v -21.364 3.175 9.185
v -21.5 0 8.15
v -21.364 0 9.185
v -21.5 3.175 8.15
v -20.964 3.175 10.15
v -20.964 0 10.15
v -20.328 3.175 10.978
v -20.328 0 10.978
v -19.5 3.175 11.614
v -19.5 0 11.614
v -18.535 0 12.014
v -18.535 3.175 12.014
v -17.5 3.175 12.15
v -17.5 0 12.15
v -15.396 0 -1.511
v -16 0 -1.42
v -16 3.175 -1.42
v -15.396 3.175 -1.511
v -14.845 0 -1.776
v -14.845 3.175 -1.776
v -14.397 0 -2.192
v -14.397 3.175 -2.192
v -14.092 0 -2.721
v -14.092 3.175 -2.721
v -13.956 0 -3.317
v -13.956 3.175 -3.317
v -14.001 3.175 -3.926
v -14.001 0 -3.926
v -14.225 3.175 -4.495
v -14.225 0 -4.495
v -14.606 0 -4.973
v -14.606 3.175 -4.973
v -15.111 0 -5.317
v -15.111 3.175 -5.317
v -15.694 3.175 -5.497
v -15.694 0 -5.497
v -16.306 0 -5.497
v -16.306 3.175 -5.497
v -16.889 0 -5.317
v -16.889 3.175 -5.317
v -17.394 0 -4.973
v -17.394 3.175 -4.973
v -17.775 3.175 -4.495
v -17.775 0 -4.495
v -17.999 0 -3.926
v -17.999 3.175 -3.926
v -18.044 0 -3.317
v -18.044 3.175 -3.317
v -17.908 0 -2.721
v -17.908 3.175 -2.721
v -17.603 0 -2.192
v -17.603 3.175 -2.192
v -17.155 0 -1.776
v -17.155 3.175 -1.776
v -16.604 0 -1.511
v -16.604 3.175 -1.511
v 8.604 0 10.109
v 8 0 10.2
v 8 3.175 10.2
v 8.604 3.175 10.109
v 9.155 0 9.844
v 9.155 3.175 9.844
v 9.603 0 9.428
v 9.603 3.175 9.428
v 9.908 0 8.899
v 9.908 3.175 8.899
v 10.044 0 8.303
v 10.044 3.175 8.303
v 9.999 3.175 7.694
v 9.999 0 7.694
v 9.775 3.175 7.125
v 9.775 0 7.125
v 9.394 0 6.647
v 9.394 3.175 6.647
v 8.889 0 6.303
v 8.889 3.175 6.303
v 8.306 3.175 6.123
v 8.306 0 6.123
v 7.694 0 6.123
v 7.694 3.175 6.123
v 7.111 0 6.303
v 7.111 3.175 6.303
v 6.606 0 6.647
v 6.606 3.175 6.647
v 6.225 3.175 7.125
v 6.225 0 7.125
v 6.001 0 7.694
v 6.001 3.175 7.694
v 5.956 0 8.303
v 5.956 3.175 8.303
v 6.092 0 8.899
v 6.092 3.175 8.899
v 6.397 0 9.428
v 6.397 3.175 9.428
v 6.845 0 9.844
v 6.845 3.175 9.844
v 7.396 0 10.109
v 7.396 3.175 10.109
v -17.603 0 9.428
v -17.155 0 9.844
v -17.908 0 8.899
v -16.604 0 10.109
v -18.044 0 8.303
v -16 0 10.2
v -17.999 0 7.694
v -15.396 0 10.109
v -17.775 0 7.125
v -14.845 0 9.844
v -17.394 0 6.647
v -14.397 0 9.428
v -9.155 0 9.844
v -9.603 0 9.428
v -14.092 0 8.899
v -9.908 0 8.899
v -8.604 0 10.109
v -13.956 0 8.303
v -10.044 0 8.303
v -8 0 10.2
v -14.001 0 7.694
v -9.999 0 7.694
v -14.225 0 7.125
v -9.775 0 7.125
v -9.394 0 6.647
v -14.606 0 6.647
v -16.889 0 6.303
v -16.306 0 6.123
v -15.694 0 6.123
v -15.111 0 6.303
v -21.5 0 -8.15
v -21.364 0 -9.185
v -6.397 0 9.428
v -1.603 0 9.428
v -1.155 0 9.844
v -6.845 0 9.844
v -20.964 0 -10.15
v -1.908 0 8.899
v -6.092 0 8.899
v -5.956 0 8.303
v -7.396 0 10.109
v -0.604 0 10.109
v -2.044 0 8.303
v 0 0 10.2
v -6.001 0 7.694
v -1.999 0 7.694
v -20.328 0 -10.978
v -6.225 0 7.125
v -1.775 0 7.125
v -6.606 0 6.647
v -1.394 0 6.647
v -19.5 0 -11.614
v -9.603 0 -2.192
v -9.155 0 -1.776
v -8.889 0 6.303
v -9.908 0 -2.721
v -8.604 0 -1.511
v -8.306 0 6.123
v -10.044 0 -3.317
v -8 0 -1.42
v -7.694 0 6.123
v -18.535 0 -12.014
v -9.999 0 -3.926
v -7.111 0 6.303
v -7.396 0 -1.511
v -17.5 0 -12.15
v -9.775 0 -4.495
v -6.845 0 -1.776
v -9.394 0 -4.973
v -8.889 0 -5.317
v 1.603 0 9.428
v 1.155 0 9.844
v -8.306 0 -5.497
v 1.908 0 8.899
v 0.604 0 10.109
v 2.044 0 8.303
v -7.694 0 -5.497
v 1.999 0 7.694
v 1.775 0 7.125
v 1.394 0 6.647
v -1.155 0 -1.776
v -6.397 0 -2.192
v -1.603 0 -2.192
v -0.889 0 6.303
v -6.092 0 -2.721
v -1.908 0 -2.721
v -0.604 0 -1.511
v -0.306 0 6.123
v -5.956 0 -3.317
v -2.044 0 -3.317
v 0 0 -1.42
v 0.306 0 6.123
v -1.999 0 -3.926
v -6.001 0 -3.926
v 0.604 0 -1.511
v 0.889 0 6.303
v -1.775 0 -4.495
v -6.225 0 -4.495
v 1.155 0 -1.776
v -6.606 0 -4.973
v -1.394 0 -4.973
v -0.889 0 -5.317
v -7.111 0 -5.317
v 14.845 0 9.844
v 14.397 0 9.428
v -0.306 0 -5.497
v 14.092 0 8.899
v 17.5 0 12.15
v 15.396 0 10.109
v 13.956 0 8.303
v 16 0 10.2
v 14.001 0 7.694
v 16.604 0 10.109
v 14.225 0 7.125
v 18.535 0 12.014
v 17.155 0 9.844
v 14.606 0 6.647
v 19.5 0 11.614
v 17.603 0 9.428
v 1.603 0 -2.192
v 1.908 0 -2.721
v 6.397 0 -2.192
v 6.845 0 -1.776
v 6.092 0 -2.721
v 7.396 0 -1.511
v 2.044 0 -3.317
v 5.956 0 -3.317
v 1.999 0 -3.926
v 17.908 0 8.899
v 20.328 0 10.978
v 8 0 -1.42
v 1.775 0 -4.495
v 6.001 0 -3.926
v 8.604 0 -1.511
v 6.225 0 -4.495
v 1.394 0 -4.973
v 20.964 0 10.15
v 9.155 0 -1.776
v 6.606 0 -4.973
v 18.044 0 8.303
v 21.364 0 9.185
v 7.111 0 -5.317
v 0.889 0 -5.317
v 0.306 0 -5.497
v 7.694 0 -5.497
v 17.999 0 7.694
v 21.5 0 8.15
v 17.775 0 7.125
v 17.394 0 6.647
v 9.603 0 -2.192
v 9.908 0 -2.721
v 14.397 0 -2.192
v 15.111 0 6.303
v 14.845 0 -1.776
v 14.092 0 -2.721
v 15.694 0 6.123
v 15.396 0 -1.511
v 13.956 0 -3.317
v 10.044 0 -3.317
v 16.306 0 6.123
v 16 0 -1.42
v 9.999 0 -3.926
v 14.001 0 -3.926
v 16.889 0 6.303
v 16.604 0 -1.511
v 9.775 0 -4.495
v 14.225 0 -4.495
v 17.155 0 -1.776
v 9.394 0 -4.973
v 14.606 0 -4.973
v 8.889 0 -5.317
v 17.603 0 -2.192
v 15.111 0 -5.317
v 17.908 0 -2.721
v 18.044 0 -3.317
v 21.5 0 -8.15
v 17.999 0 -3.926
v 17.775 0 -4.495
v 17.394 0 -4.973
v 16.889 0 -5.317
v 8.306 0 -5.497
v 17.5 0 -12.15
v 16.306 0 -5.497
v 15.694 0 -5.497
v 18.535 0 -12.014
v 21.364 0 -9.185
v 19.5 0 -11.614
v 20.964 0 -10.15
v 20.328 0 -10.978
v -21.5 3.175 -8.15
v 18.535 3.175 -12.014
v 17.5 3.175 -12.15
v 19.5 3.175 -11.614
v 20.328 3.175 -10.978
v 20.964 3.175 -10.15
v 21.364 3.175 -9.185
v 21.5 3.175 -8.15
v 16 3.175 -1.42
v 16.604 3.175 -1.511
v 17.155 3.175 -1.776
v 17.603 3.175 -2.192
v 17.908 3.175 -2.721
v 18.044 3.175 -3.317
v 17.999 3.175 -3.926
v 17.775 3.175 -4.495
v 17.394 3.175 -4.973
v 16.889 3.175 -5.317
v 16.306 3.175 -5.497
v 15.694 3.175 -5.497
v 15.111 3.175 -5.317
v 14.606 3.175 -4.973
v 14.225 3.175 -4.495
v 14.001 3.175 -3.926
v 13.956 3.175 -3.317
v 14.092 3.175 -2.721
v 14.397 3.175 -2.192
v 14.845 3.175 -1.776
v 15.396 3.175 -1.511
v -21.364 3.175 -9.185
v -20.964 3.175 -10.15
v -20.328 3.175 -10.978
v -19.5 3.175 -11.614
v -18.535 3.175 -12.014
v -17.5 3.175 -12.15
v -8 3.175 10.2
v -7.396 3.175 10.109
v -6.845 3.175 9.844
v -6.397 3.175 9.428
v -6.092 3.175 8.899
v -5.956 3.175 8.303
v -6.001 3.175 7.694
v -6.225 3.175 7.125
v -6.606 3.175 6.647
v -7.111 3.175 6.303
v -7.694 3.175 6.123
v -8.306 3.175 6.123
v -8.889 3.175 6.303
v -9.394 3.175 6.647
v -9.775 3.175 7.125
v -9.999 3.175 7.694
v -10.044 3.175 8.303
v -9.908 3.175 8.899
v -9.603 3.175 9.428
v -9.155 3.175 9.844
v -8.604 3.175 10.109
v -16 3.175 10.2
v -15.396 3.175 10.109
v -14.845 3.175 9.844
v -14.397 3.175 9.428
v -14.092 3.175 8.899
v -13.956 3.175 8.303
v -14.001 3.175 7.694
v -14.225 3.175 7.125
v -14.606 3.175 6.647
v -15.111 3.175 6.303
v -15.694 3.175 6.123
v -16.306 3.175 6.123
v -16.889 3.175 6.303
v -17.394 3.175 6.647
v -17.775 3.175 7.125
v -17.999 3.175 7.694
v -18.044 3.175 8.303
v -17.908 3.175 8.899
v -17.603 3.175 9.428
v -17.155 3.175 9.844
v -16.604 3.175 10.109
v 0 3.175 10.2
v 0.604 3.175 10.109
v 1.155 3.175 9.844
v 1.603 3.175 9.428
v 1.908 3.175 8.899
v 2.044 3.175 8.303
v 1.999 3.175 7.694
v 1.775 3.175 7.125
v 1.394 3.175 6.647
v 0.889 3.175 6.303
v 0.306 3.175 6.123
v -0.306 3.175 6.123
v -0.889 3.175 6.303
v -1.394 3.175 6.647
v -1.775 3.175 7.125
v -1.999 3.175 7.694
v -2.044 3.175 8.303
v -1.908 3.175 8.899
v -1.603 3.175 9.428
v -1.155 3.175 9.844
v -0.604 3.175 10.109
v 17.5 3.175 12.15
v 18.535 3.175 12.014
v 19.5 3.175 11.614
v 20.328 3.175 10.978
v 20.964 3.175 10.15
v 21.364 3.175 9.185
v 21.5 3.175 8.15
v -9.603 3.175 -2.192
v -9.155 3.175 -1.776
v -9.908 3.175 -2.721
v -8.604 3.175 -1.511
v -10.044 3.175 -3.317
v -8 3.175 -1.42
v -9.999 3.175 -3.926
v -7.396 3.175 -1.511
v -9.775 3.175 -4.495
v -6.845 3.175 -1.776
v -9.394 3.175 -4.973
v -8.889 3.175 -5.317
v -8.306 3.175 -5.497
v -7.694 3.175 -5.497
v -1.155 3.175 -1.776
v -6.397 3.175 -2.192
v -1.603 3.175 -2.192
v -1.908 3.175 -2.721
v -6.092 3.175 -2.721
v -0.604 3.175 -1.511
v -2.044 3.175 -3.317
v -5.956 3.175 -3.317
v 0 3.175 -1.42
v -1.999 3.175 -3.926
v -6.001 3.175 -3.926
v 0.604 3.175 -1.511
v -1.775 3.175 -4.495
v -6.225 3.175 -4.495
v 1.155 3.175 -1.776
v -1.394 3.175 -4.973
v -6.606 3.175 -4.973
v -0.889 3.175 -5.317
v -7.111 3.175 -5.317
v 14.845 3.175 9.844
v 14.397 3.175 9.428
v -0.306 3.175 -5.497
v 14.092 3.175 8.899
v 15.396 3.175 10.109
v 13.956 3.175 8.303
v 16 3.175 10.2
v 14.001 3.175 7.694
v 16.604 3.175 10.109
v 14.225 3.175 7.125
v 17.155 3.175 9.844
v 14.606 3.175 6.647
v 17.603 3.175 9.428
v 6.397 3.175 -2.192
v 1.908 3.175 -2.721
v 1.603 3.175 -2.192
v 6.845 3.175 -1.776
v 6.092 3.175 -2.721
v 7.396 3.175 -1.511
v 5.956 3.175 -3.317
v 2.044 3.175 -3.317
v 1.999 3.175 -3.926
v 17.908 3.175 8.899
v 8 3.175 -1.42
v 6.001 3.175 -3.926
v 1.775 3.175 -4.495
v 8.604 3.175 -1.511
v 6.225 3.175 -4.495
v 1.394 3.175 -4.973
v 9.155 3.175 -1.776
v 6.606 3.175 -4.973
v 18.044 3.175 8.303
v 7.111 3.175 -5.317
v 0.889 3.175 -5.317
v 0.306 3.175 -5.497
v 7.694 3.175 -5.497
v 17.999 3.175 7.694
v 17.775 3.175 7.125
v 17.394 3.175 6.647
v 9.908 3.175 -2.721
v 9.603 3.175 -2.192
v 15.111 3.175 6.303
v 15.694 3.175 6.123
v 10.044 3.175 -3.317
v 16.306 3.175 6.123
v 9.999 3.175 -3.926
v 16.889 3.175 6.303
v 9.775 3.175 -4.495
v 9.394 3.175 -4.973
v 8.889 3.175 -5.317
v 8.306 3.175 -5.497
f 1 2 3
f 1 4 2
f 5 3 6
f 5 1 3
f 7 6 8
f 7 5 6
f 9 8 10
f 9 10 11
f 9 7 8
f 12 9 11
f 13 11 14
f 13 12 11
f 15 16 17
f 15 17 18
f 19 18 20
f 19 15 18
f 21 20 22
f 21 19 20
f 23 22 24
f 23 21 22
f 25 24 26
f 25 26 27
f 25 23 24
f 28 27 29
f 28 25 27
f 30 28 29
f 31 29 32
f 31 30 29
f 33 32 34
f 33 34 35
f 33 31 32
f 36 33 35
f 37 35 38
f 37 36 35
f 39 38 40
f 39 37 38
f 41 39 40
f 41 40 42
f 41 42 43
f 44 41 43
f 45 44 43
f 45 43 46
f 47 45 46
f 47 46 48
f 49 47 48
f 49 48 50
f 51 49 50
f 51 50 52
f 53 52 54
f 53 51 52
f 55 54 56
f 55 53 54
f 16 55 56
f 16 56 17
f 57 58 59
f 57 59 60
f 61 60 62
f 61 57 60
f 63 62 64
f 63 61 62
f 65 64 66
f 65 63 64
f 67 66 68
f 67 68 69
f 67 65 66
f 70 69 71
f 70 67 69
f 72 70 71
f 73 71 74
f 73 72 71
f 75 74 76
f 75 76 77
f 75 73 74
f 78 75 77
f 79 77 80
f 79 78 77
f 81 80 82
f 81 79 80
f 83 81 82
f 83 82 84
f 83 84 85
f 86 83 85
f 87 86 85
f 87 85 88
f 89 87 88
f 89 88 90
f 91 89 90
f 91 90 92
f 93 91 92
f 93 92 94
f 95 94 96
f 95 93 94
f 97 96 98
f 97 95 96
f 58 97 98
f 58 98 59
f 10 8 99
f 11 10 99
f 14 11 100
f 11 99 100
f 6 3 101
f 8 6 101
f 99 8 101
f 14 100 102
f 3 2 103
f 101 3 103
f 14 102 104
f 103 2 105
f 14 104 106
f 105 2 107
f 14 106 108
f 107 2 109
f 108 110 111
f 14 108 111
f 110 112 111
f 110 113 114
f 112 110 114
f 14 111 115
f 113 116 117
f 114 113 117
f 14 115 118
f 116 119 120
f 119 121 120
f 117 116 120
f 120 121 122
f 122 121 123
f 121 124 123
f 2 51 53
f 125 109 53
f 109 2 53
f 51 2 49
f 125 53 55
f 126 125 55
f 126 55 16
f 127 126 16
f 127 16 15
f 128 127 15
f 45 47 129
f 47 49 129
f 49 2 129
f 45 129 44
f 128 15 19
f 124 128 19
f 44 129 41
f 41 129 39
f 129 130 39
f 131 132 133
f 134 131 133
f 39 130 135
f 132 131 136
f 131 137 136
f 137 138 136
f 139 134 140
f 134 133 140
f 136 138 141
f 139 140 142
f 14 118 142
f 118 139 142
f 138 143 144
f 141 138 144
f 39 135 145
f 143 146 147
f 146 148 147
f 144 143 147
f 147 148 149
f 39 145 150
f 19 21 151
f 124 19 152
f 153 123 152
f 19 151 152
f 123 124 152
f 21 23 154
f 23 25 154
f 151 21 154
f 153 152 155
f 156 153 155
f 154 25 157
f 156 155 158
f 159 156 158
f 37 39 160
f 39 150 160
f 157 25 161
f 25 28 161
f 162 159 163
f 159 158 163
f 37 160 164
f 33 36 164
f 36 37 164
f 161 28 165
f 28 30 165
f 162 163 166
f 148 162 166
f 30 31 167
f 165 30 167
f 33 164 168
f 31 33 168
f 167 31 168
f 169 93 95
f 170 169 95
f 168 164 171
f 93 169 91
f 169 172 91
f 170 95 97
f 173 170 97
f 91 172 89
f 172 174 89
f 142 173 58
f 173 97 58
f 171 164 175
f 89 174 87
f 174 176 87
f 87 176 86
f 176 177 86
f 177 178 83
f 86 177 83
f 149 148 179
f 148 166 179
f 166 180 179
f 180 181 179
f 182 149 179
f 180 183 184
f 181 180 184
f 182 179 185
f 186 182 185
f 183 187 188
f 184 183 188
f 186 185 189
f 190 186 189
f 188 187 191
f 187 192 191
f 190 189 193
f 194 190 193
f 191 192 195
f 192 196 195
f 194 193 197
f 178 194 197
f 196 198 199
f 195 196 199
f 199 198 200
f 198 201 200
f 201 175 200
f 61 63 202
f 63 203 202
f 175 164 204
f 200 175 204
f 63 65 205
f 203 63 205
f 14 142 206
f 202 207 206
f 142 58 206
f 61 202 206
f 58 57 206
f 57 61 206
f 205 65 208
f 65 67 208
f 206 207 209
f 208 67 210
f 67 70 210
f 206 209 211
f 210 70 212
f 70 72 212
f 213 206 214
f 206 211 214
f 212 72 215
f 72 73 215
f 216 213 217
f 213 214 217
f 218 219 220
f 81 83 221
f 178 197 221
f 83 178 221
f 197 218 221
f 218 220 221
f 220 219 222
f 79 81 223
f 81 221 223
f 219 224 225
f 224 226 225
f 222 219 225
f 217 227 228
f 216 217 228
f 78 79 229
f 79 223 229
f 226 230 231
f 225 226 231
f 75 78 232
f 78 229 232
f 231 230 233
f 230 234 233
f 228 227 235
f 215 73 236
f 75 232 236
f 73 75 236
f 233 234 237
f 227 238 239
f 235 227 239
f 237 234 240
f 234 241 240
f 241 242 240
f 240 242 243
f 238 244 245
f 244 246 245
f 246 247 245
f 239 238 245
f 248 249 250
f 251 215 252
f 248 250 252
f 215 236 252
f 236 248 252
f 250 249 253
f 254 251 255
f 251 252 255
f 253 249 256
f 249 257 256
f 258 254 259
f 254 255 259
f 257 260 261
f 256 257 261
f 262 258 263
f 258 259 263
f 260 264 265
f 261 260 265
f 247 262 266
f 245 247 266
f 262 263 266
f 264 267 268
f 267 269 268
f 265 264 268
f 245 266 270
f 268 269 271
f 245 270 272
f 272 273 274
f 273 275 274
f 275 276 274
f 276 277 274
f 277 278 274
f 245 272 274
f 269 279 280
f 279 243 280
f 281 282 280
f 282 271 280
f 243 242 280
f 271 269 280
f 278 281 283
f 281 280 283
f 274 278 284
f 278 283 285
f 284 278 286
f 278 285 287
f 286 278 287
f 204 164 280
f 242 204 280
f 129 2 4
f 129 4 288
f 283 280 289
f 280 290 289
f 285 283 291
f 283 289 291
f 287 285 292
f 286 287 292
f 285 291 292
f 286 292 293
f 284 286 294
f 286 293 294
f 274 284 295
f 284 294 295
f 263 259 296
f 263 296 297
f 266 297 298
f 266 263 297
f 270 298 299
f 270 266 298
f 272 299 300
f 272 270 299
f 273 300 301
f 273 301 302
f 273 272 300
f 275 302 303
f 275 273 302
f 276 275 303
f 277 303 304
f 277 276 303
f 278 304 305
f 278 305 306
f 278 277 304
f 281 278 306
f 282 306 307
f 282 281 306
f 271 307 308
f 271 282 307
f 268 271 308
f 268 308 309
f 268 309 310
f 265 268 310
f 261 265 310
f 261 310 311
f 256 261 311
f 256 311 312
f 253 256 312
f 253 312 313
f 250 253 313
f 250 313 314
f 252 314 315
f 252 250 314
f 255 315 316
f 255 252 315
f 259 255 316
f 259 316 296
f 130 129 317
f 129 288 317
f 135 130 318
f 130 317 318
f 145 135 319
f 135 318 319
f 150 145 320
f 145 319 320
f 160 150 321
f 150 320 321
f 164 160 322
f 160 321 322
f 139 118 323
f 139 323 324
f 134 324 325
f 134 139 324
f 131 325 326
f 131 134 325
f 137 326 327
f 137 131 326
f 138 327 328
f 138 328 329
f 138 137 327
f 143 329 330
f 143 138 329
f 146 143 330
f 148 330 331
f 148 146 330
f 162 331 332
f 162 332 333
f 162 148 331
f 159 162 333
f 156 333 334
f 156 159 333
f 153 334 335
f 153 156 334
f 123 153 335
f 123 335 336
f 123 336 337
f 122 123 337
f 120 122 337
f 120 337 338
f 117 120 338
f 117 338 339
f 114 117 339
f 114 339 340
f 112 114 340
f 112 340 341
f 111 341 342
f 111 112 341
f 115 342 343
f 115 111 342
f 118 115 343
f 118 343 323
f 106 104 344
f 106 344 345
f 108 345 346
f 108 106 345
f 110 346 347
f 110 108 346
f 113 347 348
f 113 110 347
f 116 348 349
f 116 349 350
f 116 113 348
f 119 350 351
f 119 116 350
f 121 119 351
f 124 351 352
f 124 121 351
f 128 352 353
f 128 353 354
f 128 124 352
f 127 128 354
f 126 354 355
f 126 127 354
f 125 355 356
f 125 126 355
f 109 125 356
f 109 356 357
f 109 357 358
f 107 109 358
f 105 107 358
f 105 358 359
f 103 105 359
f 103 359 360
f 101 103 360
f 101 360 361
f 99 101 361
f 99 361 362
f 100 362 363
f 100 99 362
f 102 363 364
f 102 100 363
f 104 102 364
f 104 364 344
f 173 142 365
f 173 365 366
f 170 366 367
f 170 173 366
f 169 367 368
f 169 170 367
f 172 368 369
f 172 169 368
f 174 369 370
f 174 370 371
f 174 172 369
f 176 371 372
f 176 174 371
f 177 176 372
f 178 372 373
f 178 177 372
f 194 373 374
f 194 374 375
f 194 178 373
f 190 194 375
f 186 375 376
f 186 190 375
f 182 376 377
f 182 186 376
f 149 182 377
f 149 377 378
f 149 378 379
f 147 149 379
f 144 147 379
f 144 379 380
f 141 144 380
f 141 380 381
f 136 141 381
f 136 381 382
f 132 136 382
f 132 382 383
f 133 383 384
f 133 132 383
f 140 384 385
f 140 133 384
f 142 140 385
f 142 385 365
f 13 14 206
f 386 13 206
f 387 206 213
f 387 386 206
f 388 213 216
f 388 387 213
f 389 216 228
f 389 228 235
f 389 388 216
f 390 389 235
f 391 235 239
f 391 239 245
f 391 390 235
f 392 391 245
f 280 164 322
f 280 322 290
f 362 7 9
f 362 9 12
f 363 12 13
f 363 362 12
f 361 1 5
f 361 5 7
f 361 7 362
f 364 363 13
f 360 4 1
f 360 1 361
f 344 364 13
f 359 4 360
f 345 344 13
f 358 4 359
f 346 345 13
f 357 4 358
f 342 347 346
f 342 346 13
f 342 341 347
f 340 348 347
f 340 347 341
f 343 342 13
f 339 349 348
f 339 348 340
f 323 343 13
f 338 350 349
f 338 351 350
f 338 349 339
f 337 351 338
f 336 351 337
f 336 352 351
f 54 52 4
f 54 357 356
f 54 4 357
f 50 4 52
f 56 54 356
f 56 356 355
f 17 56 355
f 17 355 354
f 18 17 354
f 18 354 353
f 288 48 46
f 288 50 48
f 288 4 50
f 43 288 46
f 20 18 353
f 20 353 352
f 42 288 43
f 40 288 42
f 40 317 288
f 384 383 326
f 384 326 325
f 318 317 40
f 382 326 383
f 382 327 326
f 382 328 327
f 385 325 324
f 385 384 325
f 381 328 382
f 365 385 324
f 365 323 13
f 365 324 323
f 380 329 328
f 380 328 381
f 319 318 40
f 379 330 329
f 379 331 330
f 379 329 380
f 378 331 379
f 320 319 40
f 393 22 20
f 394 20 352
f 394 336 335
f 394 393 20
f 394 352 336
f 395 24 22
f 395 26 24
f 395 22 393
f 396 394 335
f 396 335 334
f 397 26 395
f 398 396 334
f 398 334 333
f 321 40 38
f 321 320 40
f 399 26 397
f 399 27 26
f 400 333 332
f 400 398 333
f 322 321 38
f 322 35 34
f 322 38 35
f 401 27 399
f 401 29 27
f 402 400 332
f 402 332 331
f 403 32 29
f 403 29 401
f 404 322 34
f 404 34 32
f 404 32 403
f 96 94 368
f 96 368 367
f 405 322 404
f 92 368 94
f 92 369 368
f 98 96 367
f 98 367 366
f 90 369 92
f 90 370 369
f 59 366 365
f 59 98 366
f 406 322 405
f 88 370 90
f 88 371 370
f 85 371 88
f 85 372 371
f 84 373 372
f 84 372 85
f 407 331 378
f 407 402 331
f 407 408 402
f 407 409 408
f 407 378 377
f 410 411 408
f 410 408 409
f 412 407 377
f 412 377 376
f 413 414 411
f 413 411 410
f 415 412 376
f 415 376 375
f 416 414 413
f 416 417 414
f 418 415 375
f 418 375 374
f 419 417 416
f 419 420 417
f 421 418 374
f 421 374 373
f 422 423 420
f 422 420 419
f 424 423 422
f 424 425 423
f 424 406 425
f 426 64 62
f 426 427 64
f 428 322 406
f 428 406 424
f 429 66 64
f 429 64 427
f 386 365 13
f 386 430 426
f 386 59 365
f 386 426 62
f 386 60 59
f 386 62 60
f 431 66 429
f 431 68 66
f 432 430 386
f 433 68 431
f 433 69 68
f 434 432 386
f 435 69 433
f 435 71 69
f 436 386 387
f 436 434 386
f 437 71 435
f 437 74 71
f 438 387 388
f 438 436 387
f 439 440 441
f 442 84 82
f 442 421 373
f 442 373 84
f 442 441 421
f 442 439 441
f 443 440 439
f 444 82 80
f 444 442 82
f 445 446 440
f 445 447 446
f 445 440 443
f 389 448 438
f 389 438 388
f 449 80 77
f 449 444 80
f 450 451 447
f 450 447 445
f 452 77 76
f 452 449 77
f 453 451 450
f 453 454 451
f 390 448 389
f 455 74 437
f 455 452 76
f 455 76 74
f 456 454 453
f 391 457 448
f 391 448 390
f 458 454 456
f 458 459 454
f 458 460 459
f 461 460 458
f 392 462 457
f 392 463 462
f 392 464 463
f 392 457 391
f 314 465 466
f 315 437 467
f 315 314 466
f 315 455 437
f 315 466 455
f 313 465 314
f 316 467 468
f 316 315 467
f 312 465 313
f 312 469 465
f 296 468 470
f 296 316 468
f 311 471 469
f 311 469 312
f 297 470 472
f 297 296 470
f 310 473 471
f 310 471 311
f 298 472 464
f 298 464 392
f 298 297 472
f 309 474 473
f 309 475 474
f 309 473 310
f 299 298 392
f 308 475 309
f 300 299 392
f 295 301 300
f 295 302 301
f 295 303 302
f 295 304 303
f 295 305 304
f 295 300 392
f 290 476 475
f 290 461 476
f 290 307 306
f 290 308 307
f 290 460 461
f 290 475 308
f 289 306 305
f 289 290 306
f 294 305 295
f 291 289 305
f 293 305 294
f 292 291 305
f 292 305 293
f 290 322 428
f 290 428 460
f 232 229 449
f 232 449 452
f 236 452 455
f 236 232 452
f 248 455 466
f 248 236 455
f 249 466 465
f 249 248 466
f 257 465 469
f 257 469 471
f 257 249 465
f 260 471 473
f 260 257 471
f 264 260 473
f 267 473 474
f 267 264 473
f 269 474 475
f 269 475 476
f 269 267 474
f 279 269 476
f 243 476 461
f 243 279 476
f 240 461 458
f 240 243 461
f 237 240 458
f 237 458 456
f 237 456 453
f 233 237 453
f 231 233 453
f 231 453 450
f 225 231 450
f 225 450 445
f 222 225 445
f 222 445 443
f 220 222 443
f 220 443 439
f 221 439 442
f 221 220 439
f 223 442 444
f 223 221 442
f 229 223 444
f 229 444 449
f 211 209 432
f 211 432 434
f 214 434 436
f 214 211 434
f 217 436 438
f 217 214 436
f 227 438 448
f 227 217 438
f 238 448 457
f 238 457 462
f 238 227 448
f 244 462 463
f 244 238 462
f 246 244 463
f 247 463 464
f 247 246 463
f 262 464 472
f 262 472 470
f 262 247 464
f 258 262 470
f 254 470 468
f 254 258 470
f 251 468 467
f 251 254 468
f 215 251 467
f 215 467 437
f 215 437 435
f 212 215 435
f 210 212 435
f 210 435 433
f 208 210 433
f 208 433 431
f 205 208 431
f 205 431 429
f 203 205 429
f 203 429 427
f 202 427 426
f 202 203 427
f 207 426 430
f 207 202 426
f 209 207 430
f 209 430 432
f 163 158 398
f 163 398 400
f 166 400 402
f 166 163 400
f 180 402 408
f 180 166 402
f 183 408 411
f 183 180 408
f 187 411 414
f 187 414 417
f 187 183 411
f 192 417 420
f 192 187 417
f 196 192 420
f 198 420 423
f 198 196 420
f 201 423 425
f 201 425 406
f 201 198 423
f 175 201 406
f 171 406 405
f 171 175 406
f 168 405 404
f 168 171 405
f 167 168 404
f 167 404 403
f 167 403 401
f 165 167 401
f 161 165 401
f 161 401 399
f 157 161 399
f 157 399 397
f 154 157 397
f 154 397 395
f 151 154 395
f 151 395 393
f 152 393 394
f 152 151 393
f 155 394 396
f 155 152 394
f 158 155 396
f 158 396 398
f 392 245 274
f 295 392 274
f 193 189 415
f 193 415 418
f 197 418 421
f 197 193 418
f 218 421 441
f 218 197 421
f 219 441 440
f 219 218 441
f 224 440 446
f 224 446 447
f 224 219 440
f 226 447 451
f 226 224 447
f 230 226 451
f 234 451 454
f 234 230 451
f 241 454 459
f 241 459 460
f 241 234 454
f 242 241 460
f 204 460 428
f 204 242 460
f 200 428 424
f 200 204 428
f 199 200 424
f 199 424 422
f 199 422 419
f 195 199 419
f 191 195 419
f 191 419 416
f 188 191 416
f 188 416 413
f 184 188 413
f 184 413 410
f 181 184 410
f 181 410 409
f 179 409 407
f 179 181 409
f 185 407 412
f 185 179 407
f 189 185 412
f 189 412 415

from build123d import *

# Parameters (mm, degrees)
SKETCH1_W           = 43
SKETCH1_H           = 24.3
SKETCH1_R           = 2.05
BOSS_EXTRUDE1_DEPTH = 3.175
FILLET1_R           = 4


with BuildPart() as part:
    # Sketch1 → Boss-Extrude1 (new body)
    with BuildSketch(Plane(origin=(0, 0, 0), x_dir=(1, 0, 0), z_dir=(0, 1, 0))):
        Rectangle(SKETCH1_W, SKETCH1_H)
        with Locations(Location((-16, -8.15, 0), (0, 0, 270))):
            Circle(SKETCH1_R, mode=Mode.SUBTRACT)
        with Locations(Location((-8, -8.15, 0), (0, 0, 270))):
            Circle(SKETCH1_R, mode=Mode.SUBTRACT)
        with Locations(Location((0, -8.15, 0), (0, 0, 270))):
            Circle(SKETCH1_R, mode=Mode.SUBTRACT)
        with Locations(Location((8, -8.15, 0), (0, 0, 270))):
            Circle(SKETCH1_R, mode=Mode.SUBTRACT)
        with Locations(Location((16, -8.15, 0), (0, 0, 270))):
            Circle(SKETCH1_R, mode=Mode.SUBTRACT)
        with Locations(Location((-16, 3.47, 0), (0, 0, 270))):
            Circle(SKETCH1_R, mode=Mode.SUBTRACT)
        with Locations(Location((-8, 3.47, 0), (0, 0, 270))):
            Circle(SKETCH1_R, mode=Mode.SUBTRACT)
        with Locations(Location((0, 3.47, 0), (0, 0, 270))):
            Circle(SKETCH1_R, mode=Mode.SUBTRACT)
        with Locations(Location((8, 3.47, 0), (0, 0, 270))):
            Circle(SKETCH1_R, mode=Mode.SUBTRACT)
        with Locations(Location((16, 3.47, 0), (0, 0, 270))):
            Circle(SKETCH1_R, mode=Mode.SUBTRACT)
    extrude(amount=BOSS_EXTRUDE1_DEPTH)

    # Fillet1
    fillet1_edges = [part.edges().sort_by_distance(p)[0] for p in [
        (-21.5, 1.5875, -12.15),
        (21.5, 1.5875, -12.15),
        (21.5, 1.5875, 12.15),
        (-21.5, 1.5875, 12.15),
    ]]
    fillet(fillet1_edges, radius=FILLET1_R)


solid = part.part
